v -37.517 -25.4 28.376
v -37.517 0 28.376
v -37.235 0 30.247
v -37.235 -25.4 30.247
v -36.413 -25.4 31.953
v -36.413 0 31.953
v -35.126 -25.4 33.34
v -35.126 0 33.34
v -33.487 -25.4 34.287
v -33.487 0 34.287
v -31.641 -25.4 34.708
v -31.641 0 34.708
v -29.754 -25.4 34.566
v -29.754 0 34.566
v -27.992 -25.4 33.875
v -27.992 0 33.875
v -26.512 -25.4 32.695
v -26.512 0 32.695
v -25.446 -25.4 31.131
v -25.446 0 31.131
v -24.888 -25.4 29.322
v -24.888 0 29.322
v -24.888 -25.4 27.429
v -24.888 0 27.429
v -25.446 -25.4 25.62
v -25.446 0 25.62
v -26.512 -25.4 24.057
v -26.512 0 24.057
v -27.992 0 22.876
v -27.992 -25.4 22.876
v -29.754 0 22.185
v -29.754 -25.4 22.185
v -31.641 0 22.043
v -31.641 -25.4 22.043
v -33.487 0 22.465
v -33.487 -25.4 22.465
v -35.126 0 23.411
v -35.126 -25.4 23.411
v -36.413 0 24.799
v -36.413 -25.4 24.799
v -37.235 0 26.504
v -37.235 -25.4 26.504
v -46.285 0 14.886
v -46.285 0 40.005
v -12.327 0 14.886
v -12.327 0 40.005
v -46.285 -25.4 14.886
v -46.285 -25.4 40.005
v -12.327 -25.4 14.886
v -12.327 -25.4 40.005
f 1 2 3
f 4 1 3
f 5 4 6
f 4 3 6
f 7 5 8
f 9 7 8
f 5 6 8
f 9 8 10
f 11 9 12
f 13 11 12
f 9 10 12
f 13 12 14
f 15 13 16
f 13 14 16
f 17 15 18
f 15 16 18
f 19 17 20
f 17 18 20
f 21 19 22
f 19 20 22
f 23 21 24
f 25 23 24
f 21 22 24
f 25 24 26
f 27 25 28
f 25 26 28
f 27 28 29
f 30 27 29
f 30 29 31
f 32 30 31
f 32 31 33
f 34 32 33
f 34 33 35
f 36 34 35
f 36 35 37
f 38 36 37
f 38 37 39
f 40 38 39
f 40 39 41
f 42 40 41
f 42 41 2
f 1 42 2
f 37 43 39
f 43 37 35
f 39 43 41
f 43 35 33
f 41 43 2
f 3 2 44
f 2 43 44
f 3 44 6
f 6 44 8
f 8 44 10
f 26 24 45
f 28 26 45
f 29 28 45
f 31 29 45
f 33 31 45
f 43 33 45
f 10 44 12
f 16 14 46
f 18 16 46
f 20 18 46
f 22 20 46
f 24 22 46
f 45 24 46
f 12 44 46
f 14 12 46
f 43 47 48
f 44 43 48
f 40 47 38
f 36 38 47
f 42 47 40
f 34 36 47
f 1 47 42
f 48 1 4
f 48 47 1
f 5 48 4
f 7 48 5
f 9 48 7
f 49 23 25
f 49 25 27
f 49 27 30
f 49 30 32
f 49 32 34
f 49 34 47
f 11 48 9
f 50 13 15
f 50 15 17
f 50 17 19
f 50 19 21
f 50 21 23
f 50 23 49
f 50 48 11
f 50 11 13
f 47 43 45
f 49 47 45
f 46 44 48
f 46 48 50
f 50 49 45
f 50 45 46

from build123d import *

# Parameters (mm, degrees)
F0_W     = 33.957731
F0_H     = 25.119421
F1_DEPTH = 25.4
F3_D     = 12.7
F3_DEPTH = 25.4


with BuildPart() as f1:
    # F0 (on Front) → F1 (new body)
    with BuildSketch(Plane.XZ):
        with Locations((-29.305988, 27.445291)):
            Rectangle(F0_W, F0_H)
    extrude(amount=F1_DEPTH)

    # F3
    with Locations(Plane.XZ.offset(25.4)):
        with Locations((-31.166686, 28.375639)):
            Hole(F3_D / 2, depth=F3_DEPTH)


solid = f1.part
